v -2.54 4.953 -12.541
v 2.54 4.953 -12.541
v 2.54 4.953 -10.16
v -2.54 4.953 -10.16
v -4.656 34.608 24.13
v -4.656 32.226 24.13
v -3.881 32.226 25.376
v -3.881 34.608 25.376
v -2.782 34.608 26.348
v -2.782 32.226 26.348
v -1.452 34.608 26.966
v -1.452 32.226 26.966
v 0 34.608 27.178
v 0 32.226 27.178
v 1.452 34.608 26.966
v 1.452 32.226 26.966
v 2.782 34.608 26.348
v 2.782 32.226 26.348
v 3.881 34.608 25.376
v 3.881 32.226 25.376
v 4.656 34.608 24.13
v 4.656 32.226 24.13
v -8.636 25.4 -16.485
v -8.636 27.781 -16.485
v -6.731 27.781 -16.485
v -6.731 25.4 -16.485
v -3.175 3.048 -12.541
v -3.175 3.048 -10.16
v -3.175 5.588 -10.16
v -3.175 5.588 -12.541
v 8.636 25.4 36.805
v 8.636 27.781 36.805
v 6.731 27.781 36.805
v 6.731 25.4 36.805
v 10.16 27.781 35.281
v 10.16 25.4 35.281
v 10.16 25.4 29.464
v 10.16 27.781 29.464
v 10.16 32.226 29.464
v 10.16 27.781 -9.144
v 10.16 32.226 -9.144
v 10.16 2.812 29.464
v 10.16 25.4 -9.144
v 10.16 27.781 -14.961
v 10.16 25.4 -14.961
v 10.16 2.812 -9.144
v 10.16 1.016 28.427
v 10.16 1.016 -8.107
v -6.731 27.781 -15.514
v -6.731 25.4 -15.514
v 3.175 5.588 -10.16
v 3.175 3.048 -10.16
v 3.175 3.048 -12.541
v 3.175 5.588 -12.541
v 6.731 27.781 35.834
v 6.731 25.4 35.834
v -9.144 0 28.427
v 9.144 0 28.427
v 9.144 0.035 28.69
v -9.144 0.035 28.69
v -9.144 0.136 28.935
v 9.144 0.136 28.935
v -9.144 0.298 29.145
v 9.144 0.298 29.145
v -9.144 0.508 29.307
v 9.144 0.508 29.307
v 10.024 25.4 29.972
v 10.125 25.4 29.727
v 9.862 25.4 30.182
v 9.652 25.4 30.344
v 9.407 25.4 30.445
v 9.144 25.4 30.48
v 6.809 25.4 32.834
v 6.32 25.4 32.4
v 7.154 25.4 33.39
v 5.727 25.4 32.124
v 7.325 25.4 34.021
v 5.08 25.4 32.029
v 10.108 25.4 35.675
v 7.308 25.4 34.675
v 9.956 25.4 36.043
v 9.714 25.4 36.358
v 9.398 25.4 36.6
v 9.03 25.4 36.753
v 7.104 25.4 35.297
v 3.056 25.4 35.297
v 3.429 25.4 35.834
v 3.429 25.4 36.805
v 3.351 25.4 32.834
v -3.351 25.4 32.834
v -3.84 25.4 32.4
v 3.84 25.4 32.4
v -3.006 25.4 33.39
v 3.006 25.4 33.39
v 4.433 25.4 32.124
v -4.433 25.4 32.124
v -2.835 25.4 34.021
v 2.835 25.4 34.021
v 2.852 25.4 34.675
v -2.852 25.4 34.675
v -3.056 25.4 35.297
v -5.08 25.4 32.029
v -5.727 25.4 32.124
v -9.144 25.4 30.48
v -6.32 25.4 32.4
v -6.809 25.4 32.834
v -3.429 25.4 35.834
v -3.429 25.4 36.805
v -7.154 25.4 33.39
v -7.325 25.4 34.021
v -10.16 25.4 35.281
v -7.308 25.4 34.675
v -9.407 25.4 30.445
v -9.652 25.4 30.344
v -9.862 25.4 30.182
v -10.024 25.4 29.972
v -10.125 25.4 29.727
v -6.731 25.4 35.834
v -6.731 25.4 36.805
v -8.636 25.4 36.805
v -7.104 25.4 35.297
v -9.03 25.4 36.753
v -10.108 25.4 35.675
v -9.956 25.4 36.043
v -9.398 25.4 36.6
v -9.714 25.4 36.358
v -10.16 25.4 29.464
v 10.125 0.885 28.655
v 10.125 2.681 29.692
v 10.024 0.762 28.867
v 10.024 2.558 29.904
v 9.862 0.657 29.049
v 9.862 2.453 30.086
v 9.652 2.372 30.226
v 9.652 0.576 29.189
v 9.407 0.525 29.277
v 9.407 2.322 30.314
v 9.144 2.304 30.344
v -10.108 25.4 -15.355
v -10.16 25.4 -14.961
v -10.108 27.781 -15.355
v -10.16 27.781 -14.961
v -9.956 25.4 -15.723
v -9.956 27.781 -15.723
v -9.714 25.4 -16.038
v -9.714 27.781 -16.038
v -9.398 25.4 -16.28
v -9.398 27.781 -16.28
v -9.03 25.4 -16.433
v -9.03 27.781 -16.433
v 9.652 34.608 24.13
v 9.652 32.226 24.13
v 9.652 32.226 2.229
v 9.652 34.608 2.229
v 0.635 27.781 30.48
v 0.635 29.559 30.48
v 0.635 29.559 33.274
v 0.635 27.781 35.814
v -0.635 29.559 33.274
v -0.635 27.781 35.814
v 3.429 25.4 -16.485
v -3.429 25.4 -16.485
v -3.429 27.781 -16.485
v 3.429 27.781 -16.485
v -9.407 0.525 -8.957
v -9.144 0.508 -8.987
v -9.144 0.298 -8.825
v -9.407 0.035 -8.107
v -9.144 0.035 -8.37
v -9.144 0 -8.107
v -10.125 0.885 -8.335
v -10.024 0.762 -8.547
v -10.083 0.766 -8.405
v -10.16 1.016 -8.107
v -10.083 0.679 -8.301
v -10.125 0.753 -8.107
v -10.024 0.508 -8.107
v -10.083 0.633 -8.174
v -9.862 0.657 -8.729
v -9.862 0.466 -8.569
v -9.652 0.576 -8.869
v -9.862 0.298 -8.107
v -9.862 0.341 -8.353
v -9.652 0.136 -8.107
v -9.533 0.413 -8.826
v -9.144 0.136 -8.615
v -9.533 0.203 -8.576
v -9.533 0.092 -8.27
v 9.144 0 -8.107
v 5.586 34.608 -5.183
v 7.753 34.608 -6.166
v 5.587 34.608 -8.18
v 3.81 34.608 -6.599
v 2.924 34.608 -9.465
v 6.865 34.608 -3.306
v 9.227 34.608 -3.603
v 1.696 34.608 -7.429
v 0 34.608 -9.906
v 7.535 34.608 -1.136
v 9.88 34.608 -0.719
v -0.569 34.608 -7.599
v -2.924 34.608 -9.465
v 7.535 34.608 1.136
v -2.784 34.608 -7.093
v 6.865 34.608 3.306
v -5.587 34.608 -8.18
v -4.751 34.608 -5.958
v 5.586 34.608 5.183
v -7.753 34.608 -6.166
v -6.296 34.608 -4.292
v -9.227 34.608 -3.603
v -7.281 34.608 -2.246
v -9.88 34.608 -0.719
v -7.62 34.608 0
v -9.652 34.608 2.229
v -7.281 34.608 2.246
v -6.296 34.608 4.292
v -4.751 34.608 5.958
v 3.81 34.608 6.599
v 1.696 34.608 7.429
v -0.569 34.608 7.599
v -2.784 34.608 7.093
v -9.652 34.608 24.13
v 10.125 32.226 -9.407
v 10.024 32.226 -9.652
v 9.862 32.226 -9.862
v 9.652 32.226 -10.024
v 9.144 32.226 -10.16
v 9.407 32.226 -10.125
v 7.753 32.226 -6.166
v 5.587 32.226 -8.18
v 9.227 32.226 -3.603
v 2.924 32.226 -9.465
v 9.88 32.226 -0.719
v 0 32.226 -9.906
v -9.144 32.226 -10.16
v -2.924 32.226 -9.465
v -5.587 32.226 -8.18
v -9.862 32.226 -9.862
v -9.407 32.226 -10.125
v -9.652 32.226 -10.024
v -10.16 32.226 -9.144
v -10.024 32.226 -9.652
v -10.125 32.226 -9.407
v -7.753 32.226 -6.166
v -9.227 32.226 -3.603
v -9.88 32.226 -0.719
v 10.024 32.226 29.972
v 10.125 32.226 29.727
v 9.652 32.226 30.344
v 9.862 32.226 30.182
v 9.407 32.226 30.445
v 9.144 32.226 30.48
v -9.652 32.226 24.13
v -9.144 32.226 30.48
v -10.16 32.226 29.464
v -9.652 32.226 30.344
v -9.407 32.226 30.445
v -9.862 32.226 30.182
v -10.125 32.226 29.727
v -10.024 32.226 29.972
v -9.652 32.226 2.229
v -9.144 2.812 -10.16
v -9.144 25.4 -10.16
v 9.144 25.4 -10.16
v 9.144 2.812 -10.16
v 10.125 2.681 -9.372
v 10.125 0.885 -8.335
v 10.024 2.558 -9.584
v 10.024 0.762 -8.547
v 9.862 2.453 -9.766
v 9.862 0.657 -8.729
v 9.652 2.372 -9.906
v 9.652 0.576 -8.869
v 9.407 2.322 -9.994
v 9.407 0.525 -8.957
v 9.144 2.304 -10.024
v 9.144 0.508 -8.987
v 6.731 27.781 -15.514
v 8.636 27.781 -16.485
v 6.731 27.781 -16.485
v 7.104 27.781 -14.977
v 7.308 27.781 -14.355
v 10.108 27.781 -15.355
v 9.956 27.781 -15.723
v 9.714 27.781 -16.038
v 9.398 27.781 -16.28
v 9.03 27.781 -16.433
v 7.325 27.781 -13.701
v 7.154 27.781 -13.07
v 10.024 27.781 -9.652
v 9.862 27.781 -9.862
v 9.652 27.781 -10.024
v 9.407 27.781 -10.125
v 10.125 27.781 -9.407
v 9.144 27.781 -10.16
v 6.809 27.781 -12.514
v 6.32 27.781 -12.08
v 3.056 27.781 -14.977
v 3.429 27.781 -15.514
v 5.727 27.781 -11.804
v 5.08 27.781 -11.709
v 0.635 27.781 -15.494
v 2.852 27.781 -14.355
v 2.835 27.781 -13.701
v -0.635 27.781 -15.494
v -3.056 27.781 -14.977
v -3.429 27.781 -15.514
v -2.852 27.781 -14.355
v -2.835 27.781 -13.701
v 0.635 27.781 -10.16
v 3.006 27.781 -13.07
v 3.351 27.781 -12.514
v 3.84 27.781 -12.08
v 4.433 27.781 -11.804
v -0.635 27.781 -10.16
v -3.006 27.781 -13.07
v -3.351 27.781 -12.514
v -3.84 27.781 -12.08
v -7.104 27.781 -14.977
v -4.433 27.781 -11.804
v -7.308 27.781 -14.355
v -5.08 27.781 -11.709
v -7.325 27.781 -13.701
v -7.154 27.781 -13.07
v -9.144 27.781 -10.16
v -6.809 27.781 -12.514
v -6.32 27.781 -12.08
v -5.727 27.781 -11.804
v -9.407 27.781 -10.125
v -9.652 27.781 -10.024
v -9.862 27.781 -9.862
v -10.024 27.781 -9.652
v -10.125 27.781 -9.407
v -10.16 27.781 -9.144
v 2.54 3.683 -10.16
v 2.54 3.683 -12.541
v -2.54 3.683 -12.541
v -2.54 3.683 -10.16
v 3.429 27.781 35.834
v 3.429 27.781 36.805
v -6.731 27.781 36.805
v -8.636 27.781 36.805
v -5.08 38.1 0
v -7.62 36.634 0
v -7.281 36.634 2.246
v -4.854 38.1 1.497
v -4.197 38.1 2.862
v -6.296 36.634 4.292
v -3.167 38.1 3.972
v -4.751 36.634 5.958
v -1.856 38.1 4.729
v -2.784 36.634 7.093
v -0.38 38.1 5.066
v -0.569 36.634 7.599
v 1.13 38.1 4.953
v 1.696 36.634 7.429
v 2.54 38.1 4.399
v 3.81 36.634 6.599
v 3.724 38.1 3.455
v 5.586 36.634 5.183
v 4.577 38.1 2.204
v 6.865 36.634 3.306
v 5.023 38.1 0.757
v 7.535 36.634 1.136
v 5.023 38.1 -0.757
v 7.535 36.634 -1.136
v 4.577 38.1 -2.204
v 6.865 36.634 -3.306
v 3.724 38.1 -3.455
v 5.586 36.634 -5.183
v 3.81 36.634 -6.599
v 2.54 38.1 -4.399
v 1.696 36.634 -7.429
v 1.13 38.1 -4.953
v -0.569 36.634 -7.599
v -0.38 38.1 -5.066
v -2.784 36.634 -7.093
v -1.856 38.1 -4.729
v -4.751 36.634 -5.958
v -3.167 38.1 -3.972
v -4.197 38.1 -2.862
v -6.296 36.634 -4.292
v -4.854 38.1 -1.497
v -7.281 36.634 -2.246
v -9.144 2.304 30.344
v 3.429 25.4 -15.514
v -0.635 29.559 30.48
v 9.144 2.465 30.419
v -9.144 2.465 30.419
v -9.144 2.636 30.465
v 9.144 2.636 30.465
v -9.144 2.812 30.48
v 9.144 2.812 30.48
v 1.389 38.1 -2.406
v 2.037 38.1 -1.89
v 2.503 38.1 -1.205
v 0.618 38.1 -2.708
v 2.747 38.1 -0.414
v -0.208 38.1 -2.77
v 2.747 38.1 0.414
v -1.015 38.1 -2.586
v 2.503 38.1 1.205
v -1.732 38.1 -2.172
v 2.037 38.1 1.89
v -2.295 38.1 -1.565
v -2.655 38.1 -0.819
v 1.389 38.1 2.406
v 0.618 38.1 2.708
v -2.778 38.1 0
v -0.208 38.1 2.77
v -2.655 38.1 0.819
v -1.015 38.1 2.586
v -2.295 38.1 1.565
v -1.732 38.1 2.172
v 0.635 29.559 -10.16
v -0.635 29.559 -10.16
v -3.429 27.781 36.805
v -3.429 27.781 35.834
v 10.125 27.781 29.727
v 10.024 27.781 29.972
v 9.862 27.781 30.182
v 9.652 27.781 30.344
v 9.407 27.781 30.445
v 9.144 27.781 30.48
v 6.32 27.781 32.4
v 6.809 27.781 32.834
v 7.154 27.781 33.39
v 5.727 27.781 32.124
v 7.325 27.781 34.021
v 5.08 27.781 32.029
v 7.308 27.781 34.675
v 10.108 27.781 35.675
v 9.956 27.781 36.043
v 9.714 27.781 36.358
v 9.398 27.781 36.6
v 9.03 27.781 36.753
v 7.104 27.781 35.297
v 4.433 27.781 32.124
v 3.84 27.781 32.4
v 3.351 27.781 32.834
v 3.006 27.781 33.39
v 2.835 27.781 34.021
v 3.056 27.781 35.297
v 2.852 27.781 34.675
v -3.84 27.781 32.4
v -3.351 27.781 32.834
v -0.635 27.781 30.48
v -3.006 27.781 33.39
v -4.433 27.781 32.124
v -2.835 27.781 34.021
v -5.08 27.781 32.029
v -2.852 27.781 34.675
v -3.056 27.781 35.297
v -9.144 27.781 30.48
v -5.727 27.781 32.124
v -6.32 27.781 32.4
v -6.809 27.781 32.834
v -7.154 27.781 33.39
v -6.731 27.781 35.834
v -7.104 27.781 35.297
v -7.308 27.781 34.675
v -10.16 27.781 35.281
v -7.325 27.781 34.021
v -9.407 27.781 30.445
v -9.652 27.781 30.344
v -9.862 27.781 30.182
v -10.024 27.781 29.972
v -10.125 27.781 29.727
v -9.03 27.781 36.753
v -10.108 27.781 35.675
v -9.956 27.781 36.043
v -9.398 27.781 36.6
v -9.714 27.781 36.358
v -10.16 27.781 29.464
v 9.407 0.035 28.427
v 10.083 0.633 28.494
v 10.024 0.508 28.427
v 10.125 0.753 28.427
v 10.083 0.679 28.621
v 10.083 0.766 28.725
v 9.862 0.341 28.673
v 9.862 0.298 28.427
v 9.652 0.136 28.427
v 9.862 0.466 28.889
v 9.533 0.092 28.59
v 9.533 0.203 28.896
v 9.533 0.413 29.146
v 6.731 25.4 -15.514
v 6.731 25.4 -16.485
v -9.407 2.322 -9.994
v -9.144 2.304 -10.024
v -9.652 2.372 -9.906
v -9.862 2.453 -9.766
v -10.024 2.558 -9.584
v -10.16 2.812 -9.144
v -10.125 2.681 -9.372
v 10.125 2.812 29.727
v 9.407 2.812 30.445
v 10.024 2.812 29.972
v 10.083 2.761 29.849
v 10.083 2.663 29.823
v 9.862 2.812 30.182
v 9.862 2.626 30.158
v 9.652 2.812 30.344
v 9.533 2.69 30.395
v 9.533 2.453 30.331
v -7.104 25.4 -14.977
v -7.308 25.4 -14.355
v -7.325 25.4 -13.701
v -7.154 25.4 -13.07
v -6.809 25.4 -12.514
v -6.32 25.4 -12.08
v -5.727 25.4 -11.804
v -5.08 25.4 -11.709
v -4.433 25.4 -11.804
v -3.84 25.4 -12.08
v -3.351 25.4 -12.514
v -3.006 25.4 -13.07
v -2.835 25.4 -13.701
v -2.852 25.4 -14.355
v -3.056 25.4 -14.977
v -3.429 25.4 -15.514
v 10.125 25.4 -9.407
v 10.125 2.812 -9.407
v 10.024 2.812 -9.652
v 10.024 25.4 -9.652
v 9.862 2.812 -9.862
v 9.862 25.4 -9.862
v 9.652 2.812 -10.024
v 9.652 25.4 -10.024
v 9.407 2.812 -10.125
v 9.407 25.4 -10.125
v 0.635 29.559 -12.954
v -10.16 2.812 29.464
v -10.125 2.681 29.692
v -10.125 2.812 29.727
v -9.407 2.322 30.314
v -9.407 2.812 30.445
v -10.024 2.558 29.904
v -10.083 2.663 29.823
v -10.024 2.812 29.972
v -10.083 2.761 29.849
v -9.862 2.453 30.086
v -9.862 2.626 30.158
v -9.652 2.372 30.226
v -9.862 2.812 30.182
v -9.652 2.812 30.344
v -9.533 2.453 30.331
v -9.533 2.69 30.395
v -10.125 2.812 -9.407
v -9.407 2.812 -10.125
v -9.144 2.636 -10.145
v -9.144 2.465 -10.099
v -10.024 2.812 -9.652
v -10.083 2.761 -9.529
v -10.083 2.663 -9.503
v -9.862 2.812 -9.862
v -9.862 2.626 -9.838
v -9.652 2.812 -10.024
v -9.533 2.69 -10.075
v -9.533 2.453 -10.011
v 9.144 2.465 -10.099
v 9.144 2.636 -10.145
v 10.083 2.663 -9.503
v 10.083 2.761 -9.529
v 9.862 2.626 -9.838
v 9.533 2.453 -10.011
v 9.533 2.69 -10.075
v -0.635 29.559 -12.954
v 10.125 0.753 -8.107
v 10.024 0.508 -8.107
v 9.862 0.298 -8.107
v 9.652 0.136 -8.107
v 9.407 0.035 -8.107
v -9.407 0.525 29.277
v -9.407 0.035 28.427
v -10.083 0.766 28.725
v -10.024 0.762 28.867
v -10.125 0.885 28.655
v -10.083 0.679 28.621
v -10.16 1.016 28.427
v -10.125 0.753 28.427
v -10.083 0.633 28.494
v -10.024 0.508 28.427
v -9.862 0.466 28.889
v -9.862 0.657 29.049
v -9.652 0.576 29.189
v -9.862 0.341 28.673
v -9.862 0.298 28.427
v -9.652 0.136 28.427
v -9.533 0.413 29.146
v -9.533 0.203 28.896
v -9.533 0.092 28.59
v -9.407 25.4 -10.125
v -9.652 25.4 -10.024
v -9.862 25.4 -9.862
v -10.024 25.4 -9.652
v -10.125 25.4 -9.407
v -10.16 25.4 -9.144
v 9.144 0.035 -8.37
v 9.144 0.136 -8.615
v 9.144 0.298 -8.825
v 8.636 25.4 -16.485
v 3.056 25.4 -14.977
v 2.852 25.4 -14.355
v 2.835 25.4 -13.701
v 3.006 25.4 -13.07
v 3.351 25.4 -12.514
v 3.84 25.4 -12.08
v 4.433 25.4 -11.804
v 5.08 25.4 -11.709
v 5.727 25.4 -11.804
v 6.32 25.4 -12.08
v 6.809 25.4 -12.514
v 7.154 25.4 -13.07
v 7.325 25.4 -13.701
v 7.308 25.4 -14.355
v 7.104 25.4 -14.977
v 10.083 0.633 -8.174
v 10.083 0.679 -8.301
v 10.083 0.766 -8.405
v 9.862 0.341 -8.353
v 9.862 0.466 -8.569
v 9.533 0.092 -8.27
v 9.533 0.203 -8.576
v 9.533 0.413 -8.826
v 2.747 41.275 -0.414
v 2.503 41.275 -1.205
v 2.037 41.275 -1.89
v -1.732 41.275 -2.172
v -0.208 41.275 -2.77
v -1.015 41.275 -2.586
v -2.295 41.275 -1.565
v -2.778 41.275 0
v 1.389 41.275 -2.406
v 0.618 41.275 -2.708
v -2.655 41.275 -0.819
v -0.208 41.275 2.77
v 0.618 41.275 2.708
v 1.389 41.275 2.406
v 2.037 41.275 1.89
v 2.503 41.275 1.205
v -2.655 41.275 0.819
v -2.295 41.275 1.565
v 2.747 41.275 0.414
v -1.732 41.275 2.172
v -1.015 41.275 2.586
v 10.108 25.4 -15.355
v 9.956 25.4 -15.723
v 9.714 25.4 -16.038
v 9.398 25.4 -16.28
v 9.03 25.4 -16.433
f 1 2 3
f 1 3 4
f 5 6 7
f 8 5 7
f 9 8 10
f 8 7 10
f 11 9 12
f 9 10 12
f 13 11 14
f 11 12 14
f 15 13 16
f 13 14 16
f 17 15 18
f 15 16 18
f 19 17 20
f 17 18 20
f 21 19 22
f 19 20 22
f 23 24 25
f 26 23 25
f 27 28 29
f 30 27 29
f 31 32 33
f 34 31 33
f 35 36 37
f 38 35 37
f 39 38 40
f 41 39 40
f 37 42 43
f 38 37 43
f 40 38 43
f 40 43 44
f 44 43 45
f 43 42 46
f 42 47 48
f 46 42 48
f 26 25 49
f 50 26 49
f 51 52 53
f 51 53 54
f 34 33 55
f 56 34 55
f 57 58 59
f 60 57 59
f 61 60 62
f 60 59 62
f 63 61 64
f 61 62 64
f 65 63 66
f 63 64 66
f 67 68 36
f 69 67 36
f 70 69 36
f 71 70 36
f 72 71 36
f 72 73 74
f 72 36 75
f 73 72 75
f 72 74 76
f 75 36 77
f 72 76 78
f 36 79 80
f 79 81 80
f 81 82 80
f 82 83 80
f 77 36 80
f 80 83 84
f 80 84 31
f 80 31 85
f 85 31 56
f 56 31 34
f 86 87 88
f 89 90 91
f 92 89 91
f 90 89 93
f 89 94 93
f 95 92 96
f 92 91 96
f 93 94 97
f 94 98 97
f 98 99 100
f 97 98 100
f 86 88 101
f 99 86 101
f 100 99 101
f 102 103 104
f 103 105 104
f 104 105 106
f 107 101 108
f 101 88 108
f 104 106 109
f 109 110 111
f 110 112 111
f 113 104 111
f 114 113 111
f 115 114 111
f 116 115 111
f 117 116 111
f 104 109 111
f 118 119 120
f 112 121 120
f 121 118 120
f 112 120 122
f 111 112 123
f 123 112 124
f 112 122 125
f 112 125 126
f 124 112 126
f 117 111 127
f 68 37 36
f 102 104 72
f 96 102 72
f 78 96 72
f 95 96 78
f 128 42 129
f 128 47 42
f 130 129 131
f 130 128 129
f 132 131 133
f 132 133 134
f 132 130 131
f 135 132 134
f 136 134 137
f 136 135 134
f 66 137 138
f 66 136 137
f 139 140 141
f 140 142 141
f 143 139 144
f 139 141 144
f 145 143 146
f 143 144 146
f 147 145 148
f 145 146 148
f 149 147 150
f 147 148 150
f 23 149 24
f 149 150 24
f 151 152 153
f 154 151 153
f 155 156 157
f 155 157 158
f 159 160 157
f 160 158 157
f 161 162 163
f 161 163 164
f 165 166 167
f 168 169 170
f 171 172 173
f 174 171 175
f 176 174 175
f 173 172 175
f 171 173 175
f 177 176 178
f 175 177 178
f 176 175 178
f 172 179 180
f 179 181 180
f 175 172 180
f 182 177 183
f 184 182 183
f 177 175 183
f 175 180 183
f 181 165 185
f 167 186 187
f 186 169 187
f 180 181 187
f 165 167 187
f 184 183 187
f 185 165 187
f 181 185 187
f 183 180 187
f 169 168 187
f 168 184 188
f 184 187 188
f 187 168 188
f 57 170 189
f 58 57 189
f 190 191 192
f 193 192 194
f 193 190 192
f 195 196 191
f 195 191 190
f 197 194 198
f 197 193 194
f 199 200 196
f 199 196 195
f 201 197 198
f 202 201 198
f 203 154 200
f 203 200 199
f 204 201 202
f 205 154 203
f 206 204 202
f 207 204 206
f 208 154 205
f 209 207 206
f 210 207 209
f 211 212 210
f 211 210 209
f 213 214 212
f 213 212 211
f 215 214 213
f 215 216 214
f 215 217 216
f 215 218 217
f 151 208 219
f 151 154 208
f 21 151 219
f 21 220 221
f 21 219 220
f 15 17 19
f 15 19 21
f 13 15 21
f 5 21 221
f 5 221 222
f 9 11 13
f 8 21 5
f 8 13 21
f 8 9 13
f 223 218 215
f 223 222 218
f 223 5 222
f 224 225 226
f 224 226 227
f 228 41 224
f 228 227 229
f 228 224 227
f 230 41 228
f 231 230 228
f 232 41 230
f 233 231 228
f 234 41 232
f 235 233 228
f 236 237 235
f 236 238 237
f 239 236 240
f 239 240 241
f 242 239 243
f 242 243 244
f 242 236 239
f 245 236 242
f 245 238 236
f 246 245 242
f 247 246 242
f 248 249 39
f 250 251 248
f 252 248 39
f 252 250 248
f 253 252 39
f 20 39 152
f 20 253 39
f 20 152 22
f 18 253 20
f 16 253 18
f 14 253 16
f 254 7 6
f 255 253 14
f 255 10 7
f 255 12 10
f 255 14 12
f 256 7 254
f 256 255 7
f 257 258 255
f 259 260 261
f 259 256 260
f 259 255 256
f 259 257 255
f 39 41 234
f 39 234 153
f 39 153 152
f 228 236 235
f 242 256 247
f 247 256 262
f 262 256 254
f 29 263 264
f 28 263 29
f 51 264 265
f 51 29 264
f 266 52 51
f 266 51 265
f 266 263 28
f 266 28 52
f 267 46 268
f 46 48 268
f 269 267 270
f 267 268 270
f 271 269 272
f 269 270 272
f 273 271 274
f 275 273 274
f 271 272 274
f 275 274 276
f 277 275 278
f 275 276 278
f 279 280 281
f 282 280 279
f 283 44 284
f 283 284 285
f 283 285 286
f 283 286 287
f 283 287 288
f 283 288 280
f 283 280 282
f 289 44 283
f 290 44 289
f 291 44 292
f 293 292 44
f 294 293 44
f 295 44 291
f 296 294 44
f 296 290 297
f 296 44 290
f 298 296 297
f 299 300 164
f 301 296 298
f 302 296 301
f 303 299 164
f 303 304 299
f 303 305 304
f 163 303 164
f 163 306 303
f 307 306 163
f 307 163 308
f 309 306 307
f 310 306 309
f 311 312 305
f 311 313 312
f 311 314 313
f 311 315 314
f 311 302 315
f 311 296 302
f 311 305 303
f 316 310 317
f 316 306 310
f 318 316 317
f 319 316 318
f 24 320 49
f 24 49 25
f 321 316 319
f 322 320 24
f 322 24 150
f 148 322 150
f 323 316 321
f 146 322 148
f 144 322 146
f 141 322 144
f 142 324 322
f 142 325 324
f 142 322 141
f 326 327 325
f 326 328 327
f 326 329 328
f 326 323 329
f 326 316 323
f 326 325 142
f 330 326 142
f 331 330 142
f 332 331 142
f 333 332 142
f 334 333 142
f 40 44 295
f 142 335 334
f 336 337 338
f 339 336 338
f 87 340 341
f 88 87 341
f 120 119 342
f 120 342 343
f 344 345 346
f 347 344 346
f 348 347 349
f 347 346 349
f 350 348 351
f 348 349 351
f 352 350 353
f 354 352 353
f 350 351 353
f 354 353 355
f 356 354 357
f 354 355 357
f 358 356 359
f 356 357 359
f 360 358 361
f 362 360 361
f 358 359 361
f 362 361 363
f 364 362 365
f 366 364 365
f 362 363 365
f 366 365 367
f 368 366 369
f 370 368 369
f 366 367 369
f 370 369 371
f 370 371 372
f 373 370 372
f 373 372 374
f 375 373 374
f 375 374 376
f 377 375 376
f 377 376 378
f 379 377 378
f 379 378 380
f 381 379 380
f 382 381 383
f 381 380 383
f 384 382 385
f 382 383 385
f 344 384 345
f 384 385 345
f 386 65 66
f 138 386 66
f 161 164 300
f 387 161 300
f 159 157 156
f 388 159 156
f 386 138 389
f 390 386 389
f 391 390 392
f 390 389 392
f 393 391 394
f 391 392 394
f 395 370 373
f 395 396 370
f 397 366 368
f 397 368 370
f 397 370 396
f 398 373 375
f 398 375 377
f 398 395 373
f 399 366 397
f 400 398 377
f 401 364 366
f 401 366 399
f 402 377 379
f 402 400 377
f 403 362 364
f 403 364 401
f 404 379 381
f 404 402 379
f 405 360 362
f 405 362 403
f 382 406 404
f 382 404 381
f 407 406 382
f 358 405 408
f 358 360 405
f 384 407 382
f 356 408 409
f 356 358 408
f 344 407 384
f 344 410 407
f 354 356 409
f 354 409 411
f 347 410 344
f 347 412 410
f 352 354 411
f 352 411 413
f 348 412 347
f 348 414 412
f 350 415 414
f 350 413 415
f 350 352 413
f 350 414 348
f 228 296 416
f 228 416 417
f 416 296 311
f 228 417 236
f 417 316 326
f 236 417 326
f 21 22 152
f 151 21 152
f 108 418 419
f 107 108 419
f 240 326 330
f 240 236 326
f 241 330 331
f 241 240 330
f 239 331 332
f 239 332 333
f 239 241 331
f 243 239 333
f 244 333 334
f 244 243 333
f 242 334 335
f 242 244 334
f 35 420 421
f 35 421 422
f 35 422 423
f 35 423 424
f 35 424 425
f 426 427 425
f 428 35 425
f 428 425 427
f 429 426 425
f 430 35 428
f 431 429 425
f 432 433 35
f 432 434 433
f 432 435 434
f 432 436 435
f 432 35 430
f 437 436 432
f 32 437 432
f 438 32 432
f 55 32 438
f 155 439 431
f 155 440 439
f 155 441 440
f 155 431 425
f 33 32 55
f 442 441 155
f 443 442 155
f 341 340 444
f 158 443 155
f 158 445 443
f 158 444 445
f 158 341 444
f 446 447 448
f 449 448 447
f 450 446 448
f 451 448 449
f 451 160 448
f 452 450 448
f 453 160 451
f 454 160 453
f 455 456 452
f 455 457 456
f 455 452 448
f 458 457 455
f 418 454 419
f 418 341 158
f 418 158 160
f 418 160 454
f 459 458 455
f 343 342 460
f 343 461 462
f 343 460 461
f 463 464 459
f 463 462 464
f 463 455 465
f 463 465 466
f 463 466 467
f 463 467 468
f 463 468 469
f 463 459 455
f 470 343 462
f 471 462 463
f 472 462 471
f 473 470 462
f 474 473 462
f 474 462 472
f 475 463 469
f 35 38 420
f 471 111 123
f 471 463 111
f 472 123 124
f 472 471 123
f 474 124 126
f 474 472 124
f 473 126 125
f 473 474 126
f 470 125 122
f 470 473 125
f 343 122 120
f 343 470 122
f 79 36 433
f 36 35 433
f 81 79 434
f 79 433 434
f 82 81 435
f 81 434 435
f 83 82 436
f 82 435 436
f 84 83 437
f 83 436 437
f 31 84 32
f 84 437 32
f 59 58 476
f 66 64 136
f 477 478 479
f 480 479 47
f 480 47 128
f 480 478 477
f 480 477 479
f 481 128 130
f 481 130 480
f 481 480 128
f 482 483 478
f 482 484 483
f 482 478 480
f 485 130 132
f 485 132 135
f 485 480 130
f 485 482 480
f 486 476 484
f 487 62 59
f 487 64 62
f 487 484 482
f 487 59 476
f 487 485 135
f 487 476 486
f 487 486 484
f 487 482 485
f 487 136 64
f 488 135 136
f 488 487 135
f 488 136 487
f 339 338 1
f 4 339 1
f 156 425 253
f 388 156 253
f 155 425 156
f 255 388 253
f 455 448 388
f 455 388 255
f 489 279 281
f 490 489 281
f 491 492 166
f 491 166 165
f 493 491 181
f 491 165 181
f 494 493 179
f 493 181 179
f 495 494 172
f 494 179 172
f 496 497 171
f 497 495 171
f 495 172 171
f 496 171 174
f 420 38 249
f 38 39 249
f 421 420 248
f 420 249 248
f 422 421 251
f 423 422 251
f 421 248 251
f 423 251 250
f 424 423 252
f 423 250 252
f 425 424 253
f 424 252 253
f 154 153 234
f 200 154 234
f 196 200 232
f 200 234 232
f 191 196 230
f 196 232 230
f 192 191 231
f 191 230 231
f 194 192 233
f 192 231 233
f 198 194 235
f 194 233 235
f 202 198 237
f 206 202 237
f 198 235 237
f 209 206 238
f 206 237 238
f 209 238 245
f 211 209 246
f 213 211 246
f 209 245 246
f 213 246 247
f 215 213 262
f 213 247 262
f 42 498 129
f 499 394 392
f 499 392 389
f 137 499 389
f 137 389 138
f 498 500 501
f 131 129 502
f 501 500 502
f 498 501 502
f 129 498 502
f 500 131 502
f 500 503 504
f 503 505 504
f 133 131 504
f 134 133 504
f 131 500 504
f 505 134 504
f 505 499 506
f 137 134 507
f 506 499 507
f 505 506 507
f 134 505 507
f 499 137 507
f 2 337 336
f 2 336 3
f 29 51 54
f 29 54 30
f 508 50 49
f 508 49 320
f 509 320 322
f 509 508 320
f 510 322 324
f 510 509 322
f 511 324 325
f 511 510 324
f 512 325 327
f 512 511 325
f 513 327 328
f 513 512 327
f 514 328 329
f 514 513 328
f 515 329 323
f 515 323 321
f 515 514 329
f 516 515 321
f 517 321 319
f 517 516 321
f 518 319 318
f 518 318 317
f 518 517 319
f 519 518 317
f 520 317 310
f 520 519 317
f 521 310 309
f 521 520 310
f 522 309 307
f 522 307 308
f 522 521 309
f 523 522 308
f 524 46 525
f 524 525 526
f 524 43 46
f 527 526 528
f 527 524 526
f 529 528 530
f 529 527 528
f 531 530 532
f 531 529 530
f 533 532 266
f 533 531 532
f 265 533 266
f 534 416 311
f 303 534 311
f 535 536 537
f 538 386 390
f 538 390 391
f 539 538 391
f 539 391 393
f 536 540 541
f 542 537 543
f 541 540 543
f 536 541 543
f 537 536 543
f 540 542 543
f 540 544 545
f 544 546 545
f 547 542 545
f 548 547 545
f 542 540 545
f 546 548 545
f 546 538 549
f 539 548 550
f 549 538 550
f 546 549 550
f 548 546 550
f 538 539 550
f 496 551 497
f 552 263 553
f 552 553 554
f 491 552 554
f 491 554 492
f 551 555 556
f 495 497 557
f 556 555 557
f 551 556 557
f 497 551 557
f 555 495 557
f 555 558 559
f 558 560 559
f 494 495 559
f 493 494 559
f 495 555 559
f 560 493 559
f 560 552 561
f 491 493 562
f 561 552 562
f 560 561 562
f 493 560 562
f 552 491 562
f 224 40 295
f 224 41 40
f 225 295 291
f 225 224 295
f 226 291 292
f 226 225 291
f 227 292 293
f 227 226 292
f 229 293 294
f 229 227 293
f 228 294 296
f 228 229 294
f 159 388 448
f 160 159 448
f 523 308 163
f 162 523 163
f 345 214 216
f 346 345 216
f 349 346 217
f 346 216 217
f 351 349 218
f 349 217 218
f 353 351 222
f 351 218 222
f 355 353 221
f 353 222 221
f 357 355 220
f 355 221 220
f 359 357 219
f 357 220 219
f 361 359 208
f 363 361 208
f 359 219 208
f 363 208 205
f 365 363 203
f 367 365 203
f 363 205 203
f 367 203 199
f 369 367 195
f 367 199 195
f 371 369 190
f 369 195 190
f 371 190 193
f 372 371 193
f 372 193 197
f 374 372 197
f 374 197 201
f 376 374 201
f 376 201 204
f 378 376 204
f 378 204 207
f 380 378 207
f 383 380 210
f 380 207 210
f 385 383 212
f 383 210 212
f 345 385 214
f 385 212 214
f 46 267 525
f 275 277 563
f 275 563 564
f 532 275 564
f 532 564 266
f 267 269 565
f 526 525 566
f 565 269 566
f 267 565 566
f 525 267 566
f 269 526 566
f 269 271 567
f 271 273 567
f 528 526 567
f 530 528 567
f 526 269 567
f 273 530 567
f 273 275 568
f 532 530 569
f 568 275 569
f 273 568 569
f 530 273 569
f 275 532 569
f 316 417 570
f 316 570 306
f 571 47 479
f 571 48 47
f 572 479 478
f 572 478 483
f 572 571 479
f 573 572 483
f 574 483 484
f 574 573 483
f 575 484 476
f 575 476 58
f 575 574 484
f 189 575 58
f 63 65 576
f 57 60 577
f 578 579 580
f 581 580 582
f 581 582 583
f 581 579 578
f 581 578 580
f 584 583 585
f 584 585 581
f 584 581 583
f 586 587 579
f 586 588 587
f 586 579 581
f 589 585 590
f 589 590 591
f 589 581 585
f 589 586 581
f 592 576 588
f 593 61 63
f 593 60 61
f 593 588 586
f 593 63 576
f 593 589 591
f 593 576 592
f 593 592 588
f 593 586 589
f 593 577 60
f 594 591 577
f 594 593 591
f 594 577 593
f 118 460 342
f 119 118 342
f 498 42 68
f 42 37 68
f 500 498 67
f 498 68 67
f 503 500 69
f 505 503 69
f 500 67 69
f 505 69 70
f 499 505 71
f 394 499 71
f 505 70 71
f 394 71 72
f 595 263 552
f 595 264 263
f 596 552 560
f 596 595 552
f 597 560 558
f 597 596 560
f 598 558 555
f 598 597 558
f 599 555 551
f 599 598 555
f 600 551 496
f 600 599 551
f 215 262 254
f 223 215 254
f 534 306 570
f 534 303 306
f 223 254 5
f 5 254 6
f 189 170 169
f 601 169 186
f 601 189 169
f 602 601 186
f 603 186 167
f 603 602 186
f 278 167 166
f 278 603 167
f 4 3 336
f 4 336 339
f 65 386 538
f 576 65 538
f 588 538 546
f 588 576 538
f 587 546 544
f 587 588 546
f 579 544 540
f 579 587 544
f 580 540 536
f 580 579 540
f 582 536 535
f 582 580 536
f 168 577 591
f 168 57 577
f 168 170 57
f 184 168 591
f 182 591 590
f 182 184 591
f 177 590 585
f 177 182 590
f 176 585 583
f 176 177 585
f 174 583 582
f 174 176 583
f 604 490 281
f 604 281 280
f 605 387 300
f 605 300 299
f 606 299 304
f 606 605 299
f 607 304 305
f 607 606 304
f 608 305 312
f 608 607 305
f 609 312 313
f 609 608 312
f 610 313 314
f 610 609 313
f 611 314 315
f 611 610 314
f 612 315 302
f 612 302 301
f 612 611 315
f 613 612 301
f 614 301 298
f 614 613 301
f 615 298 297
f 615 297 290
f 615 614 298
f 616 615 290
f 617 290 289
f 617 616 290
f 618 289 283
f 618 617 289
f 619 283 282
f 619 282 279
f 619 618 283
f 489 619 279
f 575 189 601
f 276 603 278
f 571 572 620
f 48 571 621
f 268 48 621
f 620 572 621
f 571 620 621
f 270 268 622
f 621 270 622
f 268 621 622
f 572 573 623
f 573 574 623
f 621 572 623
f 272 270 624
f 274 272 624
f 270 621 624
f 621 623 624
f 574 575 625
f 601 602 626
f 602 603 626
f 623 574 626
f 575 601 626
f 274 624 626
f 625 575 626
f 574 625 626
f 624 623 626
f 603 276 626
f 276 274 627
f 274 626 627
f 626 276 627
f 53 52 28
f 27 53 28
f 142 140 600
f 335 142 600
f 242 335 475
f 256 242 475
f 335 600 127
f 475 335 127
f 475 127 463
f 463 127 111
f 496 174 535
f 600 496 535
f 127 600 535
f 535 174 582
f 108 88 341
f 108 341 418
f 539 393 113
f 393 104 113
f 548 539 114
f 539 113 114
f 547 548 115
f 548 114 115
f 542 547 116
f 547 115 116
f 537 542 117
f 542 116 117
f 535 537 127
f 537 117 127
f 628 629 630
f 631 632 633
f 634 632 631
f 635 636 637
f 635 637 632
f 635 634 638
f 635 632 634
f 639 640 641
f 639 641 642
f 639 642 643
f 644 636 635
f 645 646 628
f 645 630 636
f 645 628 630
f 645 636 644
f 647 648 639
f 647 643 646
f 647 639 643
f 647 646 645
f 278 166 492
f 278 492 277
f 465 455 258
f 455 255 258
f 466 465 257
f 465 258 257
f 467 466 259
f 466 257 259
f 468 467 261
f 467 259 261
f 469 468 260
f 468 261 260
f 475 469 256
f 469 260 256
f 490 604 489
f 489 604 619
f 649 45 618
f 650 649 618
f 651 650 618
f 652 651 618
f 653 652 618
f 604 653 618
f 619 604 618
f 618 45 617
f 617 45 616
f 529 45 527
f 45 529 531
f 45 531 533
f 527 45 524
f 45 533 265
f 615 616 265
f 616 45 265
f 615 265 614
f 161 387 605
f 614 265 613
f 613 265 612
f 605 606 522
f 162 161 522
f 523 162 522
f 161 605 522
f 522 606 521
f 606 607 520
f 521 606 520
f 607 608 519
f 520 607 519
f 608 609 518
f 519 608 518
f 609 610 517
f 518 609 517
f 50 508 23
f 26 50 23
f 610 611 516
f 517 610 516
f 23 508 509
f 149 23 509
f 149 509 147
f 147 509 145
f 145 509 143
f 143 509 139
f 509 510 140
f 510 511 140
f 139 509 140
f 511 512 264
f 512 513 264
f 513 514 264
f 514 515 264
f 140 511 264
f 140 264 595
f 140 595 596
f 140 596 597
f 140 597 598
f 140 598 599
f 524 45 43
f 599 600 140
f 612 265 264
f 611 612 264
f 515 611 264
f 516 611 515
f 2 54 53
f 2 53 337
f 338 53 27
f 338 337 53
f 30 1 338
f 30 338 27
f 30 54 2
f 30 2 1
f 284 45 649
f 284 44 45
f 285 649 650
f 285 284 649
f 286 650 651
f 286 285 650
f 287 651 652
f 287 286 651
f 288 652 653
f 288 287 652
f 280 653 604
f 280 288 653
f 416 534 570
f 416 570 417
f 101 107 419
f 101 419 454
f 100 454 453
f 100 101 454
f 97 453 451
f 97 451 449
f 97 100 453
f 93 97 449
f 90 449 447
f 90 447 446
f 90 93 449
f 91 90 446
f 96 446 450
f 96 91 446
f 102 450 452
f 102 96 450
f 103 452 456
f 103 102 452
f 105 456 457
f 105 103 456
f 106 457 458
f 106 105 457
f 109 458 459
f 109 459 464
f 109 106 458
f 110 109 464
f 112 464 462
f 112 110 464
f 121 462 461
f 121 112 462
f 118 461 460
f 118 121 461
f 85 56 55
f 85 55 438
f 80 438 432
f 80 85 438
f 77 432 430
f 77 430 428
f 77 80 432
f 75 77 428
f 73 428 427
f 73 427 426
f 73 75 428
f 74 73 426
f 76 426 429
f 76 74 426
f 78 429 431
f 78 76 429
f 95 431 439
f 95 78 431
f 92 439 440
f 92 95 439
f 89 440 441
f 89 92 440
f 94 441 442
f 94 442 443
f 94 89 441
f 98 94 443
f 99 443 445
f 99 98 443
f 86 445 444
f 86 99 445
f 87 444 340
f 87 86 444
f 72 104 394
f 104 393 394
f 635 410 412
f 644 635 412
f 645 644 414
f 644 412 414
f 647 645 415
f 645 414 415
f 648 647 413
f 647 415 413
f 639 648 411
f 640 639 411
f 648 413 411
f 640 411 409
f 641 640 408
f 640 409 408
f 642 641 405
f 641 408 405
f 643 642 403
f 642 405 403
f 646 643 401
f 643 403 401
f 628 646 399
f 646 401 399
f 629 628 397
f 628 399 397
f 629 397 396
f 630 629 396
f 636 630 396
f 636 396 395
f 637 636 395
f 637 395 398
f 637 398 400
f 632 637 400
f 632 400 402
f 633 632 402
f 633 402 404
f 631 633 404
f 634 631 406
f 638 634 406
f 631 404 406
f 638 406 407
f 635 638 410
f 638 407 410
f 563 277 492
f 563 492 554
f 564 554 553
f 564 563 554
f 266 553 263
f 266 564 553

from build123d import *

# Parameters (mm, degrees)
SKETCH1_W             = 20.32
SKETCH1_H             = 40.64
EXTRUDE1_DEPTH        = 25.4
SKETCH2_W             = 20.32
SKETCH2_H             = 40.64
EXTRUDE2_DEPTH        = 2.38125
SKETCH3_W             = 20.32
SKETCH3_H             = 40.64
EXTRUDE3_DEPTH        = 4.445
EXTRUDE4_DEPTH        = 2.38125
SKETCH5_R             = 7.62
EXTRUDE5_DEPTH        = 3.4925
CHAMFER1_SIZE         = 2.54
CHAMFER1_SIZE2        = 1.466469684
EXTRUDE6_DEPTH        = 0.635
SKETCH8_R             = 2.778125
EXTRUDE7_DEPTH        = 3.175
CHAMFER2_SIZE         = 2.54
CHAMFER2_SIZE2        = 1.466469684
CHAMFER2_PART_2_SIZE  = 2.54
CHAMFER2_PART_2_SIZE2 = 1.466469684
FILLET1_R             = 1.016
FILLET2_R             = 1.524
SKETCH9_W             = 6.35
SKETCH9_H             = 2.54
EXTRUDE8_DEPTH        = 2.38125
SKETCH10_W            = 5.08
SKETCH10_H            = 1.27
CUT_EXTRUDE1_DEPTH    = 2.38125


with BuildPart() as part:
    # Sketch1 → Extrude1 (new body)
    with BuildSketch(Plane(origin=(0, 0, 0), x_dir=(1, 0, 0), z_dir=(0, 1, 0))):
        with Locations((0, -10.16)):
            Rectangle(SKETCH1_W, SKETCH1_H)
    extrude(amount=EXTRUDE1_DEPTH)

    # Sketch2 → Extrude2 (add)
    with BuildSketch(Plane(origin=(0, 25.4, 0), x_dir=(-1, 0, 0), z_dir=(0, 1, 0))):
        with Locations((0, 10.16)):
            Rectangle(SKETCH2_W, SKETCH2_H)
        with BuildLine():
            ThreePointArc((6.731, -15.51418631), (5.08, -11.7094), (3.429, -15.51418631))
            Line((3.429, -15.51418631), (3.429, -16.4846))
            Line((3.429, -16.4846), (-3.429, -16.4846))
            Line((-3.429, -16.4846), (-3.429, -15.51418631))
            ThreePointArc((-3.429, -15.51418631), (-5.08, -11.7094), (-6.731, -15.51418631))
            Line((-6.731, -15.51418631), (-6.731, -16.4846))
            Line((-6.731, -16.4846), (-10.16, -16.4846))
            Line((-10.16, -16.4846), (-10.16, -10.16))
            Line((-10.16, -10.16), (10.16, -10.16))
            Line((10.16, -10.16), (10.16, -16.4846))
            Line((10.16, -16.4846), (6.731, -16.4846))
            Line((6.731, -16.4846), (6.731, -15.51418631))
        make_face()
        with BuildLine():
            ThreePointArc((-6.731, 35.83418631), (-5.08, 32.0294), (-3.429, 35.83418631))
            Line((-3.429, 35.83418631), (-3.429, 36.8046))
            Line((-3.429, 36.8046), (3.429, 36.8046))
            Line((3.429, 36.8046), (3.429, 35.83418631))
            ThreePointArc((3.429, 35.83418631), (5.08, 32.0294), (6.731, 35.83418631))
            Line((6.731, 35.83418631), (6.731, 36.8046))
            Line((6.731, 36.8046), (10.16, 36.8046))
            Line((10.16, 36.8046), (10.16, 30.48))
            Line((10.16, 30.48), (-10.16, 30.48))
            Line((-10.16, 30.48), (-10.16, 36.8046))
            Line((-10.16, 36.8046), (-6.731, 36.8046))
            Line((-6.731, 36.8046), (-6.731, 35.83418631))
        make_face()
    extrude(amount=EXTRUDE2_DEPTH)

    # Sketch3 → Extrude3 (add)
    with BuildSketch(Plane(origin=(0, 27.78125, 0), x_dir=(-1, 0, 0), z_dir=(0, 1, 0))):
        with Locations((0, 10.16)):
            Rectangle(SKETCH3_W, SKETCH3_H)
    extrude(amount=EXTRUDE3_DEPTH)

    # Sketch4 → Extrude4 (add)
    with BuildSketch(Plane(origin=(0, 32.22625, 0), x_dir=(-1, 0, 0), z_dir=(0, 1, 0))):
        with BuildLine():
            Line((9.652, 2.228840954), (9.652, 24.13))
            Line((9.652, 24.13), (4.655896906, 24.13))
            ThreePointArc((4.655896906, 24.13), (0, 27.178), (-4.655896906, 24.13))
            Line((-4.655896906, 24.13), (-9.652, 24.13))
            Line((-9.652, 24.13), (-9.652, 2.228840954))
            ThreePointArc((-9.652, 2.228840954), (0, -9.906), (9.652, 2.228840954))
        make_face()
    extrude(amount=EXTRUDE4_DEPTH)

    # Sketch5 → Extrude5 (add)
    with BuildSketch(Plane(origin=(0, 34.6075, 0), x_dir=(-1, 0, 0), z_dir=(0, 1, 0))):
        Circle(SKETCH5_R)
    extrude(amount=EXTRUDE5_DEPTH)

    # Chamfer1
    chamfer1_edges = [part.edges().sort_by_distance(p)[0] for p in [
        (7.62, 38.1, 0),
    ]]
    chamfer1_side = [part.faces().sort_by_distance(p)[0] for p in [
        (0, 38.1, 0),
    ]]
    chamfer(chamfer1_edges, length=CHAMFER1_SIZE, length2=CHAMFER1_SIZE2, reference=chamfer1_side[0])

    # Sketch7 → Extrude6 (add, symmetric)
    with BuildSketch(Plane(origin=(0, 0, 0), x_dir=(0, 0, -1), z_dir=(1, 0, 0))):
        Polygon((15.494, 27.78125), (12.954, 29.55925), (10.16, 29.55925), (10.16, 27.78125), align=None)
    extrude6 = extrude(amount=EXTRUDE6_DEPTH, both=True)

    # Mirror1: Extrude6 across plane
    add(extrude6.mirror(Plane(origin=(0, 0, 10.16), x_dir=(1, 0, 0), z_dir=(0, 0, -1))))

    # Sketch8 → Extrude7 (add)
    with BuildSketch(Plane(origin=(0, 38.1, 0), x_dir=(-1, 0, 0), z_dir=(0, 1, 0))):
        Circle(SKETCH8_R)
    extrude(amount=EXTRUDE7_DEPTH)

    # Chamfer2
    chamfer2_edges = [part.edges().sort_by_distance(p)[0] for p in [
        (0, 0, -10.16),
    ]]
    chamfer2_side = [part.faces().sort_by_distance(p)[0] for p in [
        (0, 12.7, -10.16),
    ]]
    chamfer(chamfer2_edges, length=CHAMFER2_SIZE, length2=CHAMFER2_SIZE2, reference=chamfer2_side[0])

    # Chamfer2 part 2
    chamfer2_part_2_edges = [part.edges().sort_by_distance(p)[0] for p in [
        (0, 0, 30.48),
    ]]
    chamfer2_part_2_side = [part.faces().sort_by_distance(p)[0] for p in [
        (0, 12.7, 30.48),
    ]]
    chamfer(chamfer2_part_2_edges, length=CHAMFER2_PART_2_SIZE, length2=CHAMFER2_PART_2_SIZE2, reference=chamfer2_part_2_side[0])

    # Fillet1
    fillet1_edges = [part.edges().sort_by_distance(p)[0] for p in [
        (-10.16, 30.00375, -10.16),
        (10.16, 30.00375, -10.16),
        (10.16, 30.00375, 30.48),
        (10.16, 0, 10.16),
        (10.16, 1.27, -9.426765158),
        (10.16, 13.97, -10.16),
        (0, 0, -8.693530316),
        (0, 2.54, -10.16),
        (-10.16, 13.97, -10.16),
        (-10.16, 1.27, -9.426765158),
        (10.16, 13.97, 30.48),
        (10.16, 1.27, 29.746765158),
        (0, 2.54, 30.48),
        (-10.16, 0, 10.16),
        (0, 0, 29.013530316),
        (-10.16, 1.27, 29.746765158),
        (-10.16, 13.97, 30.48),
        (-10.16, 30.00375, 30.48),
    ]]
    fillet(fillet1_edges, radius=FILLET1_R)

    # Fillet2
    fillet2_edges = [part.edges().sort_by_distance(p)[0] for p in [
        (-10.16, 26.590625, 36.8046),
        (10.16, 26.590625, 36.8046),
        (-10.16, 26.590625, -16.4846),
        (10.16, 26.590625, -16.4846),
    ]]
    fillet(fillet2_edges, radius=FILLET2_R)

    # Sketch9 → Extrude8 (add)
    with BuildSketch(Plane(origin=(0, 0, -10.16), x_dir=(-1, 0, 0), z_dir=(0, 0, -1))):
        with Locations((0, 4.318)):
            Rectangle(SKETCH9_W, SKETCH9_H)
    extrude(amount=EXTRUDE8_DEPTH)

    # Sketch10 → Cut-Extrude1 (cut)
    with BuildSketch(Plane(origin=(0, 0, -12.54125), x_dir=(-1, 0, 0), z_dir=(0, 0, -1))):
        with Locations((0, 4.318)):
            Rectangle(SKETCH10_W, SKETCH10_H)
    extrude(amount=-CUT_EXTRUDE1_DEPTH, mode=Mode.SUBTRACT)


solid = part.part
